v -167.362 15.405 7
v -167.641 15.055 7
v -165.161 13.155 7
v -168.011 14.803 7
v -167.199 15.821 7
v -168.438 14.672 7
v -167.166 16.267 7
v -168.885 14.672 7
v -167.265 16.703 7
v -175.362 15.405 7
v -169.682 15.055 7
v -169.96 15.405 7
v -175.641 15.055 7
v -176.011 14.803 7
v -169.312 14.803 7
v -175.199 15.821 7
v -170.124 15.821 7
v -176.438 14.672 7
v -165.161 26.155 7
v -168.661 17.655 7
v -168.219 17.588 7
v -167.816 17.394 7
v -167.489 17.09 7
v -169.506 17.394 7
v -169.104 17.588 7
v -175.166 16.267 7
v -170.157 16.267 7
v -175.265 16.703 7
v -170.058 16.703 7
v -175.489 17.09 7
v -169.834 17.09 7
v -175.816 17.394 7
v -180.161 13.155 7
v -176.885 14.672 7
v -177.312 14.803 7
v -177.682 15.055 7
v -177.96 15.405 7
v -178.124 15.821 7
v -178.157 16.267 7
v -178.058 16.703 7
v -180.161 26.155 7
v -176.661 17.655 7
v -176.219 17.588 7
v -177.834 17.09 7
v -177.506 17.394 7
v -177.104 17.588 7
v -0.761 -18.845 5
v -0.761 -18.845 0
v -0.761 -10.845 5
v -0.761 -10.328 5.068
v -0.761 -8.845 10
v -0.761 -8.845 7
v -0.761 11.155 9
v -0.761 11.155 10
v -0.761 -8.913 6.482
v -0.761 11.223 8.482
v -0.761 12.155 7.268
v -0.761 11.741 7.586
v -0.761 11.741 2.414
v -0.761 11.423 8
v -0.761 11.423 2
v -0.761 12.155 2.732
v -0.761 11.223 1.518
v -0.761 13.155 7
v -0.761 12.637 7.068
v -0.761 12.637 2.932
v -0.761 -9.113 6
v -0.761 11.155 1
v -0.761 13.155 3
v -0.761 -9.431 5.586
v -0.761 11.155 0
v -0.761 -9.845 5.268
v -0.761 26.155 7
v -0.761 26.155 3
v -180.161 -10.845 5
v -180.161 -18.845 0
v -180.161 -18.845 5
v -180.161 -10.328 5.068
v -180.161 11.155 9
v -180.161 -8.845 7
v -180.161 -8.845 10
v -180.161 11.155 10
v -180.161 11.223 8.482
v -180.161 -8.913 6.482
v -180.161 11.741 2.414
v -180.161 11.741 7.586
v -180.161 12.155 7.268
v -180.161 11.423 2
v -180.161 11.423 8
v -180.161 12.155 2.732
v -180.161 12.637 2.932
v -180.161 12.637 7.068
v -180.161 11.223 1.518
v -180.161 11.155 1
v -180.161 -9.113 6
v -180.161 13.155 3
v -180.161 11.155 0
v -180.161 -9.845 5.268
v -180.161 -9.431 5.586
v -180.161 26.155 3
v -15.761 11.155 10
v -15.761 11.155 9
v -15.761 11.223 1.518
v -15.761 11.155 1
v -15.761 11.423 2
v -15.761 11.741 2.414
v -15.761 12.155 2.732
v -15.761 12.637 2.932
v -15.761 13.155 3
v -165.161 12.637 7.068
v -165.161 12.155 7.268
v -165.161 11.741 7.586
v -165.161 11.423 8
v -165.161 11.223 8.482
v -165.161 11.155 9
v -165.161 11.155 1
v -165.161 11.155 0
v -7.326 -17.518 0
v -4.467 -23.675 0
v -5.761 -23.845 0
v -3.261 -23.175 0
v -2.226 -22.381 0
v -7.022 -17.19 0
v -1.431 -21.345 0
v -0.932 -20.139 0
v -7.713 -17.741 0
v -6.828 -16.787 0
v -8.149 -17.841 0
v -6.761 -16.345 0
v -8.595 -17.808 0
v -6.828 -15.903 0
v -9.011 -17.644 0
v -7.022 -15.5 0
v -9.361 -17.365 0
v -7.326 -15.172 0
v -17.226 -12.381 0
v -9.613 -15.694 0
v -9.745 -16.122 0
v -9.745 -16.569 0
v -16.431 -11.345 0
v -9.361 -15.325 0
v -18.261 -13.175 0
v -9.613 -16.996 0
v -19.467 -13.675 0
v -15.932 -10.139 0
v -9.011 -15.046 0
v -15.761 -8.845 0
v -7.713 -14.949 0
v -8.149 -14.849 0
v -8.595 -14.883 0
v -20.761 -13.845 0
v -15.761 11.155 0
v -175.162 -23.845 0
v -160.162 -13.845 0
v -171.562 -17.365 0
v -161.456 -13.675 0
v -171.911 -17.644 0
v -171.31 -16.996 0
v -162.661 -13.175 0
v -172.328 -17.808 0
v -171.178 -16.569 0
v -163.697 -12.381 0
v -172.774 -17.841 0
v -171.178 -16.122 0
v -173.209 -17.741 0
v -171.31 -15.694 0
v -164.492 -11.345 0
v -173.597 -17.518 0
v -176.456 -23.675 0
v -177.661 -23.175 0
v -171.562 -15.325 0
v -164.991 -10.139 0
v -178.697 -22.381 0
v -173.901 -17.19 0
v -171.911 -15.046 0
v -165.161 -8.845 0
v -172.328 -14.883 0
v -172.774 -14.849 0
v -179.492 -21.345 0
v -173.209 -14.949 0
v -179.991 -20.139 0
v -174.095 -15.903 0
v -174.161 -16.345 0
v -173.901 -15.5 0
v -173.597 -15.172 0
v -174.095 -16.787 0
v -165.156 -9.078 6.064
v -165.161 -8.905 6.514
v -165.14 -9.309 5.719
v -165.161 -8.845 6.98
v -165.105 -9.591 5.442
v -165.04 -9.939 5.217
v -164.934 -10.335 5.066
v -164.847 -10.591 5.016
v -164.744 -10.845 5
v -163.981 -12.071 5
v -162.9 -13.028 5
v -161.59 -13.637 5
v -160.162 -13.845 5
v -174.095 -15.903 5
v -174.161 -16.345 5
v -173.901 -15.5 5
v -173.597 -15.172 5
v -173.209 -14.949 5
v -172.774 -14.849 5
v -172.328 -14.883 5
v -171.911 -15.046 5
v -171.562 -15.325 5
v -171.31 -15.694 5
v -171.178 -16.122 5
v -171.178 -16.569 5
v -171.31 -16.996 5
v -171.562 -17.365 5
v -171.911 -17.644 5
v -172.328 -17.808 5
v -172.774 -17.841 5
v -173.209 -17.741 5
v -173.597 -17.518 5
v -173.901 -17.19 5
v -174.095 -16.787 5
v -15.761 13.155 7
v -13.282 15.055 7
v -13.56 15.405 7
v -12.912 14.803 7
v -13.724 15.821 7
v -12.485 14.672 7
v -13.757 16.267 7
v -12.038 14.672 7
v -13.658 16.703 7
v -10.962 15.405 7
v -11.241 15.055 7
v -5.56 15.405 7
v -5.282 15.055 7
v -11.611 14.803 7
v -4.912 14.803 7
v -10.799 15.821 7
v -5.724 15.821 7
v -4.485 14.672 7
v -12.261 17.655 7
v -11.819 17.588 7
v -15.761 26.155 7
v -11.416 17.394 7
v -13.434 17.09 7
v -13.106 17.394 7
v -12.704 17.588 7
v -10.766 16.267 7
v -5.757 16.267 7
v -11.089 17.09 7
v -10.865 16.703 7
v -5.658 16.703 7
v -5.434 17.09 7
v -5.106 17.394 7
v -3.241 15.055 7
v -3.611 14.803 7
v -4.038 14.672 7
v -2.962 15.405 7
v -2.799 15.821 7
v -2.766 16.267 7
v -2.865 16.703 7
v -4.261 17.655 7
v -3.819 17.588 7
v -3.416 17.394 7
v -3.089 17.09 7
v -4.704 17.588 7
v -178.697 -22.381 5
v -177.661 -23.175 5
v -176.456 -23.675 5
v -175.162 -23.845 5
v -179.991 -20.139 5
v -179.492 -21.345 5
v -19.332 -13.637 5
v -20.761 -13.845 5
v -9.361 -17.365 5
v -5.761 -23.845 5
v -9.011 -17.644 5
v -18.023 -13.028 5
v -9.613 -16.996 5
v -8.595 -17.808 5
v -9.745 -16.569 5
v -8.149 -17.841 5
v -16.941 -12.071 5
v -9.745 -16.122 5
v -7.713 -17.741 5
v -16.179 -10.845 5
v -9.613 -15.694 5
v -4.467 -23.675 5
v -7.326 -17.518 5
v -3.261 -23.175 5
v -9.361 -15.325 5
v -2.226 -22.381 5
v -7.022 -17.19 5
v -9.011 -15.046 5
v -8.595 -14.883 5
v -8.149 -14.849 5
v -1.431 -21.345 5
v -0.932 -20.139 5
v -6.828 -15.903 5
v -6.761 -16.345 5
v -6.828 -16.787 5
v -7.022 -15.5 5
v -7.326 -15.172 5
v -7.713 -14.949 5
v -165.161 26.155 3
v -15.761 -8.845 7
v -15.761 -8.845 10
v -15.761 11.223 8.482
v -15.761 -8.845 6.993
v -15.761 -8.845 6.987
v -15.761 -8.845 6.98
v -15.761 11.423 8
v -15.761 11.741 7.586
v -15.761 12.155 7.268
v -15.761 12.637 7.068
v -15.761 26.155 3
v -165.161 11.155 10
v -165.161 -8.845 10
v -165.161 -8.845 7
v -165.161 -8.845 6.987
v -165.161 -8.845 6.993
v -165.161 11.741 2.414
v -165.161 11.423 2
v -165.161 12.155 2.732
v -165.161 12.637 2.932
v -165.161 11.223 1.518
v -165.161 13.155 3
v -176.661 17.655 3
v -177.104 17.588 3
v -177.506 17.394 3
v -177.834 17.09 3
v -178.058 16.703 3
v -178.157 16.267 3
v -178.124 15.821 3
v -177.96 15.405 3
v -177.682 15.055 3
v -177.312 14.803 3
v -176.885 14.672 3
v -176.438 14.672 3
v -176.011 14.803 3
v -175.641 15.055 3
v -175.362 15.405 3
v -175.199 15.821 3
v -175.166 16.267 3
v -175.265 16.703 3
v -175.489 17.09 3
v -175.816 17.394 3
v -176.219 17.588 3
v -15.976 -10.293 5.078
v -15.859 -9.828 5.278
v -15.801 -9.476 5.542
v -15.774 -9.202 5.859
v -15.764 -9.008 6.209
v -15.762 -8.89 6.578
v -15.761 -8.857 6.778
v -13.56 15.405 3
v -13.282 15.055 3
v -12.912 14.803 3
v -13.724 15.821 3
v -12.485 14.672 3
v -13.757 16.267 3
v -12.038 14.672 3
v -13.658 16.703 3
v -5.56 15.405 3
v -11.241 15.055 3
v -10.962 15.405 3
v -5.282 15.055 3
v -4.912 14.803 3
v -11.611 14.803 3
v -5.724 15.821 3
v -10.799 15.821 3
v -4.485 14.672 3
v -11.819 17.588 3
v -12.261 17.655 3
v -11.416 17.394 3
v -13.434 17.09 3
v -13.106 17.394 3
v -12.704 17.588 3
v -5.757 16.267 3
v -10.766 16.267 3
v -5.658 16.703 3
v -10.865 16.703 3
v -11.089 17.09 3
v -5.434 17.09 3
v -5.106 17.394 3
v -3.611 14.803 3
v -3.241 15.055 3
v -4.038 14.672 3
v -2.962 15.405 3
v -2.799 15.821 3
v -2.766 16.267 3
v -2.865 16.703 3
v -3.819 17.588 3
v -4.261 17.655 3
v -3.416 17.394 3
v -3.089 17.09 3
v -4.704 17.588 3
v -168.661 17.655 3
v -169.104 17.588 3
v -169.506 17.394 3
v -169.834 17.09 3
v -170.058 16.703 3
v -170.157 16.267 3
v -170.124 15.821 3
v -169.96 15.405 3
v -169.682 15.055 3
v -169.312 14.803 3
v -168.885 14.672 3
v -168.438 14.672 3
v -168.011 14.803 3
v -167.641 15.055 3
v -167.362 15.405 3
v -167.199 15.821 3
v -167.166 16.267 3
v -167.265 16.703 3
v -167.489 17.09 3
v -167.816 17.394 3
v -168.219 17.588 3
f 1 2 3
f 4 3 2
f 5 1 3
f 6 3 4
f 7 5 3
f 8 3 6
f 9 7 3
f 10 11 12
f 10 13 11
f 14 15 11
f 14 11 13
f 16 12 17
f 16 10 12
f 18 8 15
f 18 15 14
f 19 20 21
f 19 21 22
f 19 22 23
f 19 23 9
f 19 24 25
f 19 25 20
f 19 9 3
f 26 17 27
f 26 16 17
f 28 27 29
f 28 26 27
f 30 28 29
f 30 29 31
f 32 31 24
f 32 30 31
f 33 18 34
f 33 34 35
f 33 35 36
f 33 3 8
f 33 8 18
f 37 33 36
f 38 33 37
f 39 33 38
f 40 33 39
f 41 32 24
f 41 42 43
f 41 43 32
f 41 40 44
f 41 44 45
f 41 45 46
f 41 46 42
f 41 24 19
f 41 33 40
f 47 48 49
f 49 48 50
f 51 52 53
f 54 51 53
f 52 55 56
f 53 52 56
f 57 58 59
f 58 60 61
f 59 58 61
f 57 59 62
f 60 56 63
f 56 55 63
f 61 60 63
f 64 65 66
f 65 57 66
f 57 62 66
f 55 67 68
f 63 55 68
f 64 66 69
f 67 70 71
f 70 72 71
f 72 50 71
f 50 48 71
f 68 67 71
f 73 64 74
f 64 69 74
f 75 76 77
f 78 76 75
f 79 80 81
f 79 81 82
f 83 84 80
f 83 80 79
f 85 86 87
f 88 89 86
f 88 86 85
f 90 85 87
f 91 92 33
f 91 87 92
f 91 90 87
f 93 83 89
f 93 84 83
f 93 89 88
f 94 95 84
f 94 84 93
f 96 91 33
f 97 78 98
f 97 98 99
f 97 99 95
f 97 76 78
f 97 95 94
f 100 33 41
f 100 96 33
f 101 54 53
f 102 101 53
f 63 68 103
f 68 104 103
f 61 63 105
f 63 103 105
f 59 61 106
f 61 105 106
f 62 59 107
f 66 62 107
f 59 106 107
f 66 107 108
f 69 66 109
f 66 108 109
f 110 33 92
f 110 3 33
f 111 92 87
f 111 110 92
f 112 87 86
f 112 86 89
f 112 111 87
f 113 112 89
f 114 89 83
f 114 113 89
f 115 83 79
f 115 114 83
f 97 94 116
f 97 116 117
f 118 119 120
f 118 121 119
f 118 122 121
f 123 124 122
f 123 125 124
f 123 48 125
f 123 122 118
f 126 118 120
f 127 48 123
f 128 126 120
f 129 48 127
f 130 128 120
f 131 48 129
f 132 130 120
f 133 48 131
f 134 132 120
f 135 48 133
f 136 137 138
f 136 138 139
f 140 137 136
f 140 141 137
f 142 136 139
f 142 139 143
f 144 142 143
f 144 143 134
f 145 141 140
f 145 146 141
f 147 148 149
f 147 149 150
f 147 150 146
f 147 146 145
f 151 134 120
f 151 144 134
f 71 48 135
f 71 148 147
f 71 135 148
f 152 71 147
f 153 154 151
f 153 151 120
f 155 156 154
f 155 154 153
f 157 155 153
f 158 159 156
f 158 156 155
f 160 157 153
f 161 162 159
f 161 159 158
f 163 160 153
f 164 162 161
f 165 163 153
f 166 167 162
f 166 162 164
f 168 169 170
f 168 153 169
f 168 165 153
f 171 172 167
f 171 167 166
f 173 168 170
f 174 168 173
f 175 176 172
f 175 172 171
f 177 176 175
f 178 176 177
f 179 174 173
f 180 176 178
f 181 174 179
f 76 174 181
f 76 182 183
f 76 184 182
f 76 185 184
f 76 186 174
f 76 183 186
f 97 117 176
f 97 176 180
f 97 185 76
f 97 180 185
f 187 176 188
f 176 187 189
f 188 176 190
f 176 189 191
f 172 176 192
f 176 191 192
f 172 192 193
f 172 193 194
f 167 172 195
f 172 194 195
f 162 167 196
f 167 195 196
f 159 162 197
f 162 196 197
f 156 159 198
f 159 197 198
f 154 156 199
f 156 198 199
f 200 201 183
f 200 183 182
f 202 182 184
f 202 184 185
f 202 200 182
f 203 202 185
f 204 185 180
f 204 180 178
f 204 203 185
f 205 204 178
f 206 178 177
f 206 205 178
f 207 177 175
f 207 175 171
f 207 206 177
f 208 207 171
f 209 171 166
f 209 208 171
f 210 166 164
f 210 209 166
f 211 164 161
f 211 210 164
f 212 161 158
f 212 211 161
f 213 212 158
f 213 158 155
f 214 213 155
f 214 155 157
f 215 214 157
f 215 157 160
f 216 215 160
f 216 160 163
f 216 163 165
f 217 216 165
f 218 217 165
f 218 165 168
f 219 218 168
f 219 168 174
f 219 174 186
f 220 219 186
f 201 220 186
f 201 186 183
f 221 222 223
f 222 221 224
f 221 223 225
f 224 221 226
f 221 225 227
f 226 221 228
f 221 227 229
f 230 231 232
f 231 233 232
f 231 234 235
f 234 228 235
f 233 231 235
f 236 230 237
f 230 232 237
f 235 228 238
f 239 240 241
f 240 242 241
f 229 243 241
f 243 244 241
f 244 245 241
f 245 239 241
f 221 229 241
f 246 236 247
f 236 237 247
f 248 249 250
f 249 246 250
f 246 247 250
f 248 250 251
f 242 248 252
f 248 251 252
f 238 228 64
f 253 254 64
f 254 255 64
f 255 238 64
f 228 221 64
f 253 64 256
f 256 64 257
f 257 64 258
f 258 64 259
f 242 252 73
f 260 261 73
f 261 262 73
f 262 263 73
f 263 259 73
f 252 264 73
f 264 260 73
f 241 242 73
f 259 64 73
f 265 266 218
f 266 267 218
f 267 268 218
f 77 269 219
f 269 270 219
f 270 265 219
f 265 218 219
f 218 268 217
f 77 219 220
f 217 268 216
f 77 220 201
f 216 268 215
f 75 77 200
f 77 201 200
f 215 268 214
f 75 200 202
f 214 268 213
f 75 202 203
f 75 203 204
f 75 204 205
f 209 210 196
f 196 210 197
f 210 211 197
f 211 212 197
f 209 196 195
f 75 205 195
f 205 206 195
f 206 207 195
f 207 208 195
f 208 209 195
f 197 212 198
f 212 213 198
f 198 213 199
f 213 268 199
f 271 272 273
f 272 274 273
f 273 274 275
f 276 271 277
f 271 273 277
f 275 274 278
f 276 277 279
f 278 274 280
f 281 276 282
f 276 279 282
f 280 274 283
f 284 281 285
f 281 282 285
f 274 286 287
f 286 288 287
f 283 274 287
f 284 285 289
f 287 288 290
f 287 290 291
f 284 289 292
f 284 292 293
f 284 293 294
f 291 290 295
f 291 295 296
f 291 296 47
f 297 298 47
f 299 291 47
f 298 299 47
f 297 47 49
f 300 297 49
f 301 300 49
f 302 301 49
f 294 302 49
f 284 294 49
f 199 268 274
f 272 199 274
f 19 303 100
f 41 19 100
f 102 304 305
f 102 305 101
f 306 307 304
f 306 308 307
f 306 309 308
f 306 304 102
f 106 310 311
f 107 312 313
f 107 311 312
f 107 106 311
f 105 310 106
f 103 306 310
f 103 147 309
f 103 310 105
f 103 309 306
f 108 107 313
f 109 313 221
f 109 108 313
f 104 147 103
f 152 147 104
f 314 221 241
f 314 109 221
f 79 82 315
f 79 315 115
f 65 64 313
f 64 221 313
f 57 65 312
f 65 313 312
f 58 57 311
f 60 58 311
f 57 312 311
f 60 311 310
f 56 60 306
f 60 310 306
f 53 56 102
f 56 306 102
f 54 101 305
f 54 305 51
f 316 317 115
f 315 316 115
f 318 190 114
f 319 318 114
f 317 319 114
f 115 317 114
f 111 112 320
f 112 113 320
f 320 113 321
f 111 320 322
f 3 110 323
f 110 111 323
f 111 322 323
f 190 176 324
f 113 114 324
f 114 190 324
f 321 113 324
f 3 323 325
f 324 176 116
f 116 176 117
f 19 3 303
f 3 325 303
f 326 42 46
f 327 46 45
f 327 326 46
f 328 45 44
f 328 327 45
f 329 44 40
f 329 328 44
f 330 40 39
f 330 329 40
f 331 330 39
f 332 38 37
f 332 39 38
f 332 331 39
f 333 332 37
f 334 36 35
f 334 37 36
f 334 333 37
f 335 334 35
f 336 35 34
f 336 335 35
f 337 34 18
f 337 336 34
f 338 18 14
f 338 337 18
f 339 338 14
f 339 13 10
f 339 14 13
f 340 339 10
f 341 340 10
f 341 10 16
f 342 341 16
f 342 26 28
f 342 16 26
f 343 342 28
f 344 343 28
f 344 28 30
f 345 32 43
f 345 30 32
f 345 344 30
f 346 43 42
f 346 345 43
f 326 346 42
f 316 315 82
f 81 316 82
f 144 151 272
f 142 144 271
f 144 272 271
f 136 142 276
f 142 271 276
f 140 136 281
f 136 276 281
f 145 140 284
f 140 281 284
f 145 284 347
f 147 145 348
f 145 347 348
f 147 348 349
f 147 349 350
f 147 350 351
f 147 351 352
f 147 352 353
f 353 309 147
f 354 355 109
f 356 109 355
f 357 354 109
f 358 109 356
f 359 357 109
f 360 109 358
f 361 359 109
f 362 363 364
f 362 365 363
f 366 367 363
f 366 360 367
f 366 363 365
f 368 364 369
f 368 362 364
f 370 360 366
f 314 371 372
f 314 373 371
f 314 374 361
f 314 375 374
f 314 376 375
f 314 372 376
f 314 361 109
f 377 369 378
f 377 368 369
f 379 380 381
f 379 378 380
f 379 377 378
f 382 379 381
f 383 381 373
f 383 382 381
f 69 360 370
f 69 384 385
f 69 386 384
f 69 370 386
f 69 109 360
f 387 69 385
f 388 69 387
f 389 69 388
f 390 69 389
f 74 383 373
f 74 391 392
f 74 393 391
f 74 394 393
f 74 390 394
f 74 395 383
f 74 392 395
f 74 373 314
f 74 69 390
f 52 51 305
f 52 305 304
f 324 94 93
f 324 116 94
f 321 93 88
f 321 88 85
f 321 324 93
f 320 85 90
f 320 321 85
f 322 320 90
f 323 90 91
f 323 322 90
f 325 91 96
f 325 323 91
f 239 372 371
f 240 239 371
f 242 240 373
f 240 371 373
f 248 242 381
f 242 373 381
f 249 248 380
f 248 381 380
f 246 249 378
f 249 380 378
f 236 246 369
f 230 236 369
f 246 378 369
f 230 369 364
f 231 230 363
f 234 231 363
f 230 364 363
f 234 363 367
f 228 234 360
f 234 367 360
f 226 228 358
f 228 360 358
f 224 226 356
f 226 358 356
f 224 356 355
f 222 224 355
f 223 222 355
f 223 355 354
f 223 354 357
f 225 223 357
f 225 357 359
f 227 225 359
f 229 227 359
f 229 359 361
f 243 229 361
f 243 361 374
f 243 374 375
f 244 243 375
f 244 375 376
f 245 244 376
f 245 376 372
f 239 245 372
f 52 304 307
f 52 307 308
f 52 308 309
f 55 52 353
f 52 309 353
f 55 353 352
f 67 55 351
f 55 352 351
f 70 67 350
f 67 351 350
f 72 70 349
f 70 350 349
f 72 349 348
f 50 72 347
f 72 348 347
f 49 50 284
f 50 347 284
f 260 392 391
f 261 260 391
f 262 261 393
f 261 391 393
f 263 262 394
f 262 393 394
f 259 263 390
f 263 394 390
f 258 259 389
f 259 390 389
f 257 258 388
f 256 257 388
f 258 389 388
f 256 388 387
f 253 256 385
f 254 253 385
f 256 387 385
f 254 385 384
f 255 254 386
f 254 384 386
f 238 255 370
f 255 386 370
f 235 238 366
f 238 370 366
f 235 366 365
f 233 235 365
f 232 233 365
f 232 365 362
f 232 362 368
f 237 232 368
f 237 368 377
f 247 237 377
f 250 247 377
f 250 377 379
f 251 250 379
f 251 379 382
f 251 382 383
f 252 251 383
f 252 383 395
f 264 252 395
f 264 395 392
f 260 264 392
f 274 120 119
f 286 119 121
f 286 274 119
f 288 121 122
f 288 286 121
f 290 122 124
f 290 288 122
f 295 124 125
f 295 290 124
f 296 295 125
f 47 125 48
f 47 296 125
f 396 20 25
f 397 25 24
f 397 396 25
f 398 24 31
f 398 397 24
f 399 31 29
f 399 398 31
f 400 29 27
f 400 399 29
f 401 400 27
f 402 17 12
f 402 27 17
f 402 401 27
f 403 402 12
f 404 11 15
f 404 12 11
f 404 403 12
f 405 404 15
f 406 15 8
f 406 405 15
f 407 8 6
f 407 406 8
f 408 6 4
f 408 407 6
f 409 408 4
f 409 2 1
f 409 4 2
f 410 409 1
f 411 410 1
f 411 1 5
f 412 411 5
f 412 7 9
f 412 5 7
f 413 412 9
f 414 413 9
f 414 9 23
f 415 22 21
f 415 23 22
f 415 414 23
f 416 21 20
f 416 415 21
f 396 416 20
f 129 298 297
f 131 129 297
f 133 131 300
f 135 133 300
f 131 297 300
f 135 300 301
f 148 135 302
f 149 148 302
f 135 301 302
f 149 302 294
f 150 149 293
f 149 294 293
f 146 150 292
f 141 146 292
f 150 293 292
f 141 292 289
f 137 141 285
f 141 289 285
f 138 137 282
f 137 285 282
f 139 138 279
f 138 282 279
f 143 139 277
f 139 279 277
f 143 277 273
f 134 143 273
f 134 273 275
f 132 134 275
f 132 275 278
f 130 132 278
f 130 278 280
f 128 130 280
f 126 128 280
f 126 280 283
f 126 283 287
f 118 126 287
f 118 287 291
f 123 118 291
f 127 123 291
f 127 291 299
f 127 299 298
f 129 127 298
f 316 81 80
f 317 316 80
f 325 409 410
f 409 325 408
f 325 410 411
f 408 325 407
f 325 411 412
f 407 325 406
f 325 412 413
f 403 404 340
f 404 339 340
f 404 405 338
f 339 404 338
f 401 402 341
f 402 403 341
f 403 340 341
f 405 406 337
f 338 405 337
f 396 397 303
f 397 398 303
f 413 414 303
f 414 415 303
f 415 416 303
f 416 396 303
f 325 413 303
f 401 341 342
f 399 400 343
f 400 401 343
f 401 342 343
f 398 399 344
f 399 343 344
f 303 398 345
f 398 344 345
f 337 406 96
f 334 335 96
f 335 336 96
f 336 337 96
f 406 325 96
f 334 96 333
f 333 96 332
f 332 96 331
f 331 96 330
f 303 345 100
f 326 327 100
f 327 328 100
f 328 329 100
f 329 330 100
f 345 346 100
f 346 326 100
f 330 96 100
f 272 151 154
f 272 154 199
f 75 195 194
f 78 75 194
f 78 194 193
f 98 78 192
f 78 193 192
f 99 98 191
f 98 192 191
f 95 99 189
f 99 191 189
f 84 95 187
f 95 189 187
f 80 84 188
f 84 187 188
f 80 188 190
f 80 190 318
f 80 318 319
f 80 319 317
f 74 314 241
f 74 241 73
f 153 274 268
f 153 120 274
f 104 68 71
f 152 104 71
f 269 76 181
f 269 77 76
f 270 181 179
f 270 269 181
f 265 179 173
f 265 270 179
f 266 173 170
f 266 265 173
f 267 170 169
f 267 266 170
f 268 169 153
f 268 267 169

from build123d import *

# Parameters (mm, degrees)
SKETCH1_W            = 15
SKETCH1_H            = 50
BOSS_EXTRUDE1_DEPTH  = 10
SKETCH2_W            = 3
SKETCH2_H            = 15
CUT_EXTRUDE1_DEPTH   = 20
SKETCH3_R            = 1.5
CUT_EXTRUDE2_DEPTH   = 20
SKETCH4_W            = 5
SKETCH4_H            = 15
CUT_EXTRUDE3_DEPTH   = 20
CUT_EXTRUDE4_REACH   = 32.943
SKETCH5_R            = 1.5
FILLET1_R            = 2
SKETCH6_W            = 5
SKETCH6_H            = 10
BOSS_EXTRUDE2_DEPTH  = 149.4
FILLET1_OF_MIRROR5_R = 2
FILLET2_R            = 5


with BuildPart() as part:
    # Sketch1 → Boss-Extrude1 (new body)
    with BuildSketch(Plane.XY):
        with Locations((-8.26142132, 1.154822335)):
            Rectangle(SKETCH1_W, SKETCH1_H)
    boss_extrude1 = extrude(amount=BOSS_EXTRUDE1_DEPTH)

    # Sketch2 → Cut-Extrude1 (cut)
    with BuildSketch(Plane(origin=(-0.76142132, 0, 0), x_dir=(0, 0, -1), z_dir=(1, 0, 0))):
        with Locations((-1.5, 18.654822335)):
            Rectangle(SKETCH2_W, SKETCH2_H)
        with Locations((-8.5, 18.654822335)):
            Rectangle(SKETCH2_W, SKETCH2_H)
    cut_extrude1 = extrude(amount=-CUT_EXTRUDE1_DEPTH, mode=Mode.SUBTRACT)

    # Sketch3 → Cut-Extrude2 (cut)
    with BuildSketch(Plane(origin=(0, 0, 3), x_dir=(-1, 0, 0), z_dir=(0, 0, -1))):
        with Locations(Location((4.26142132, 16.154822335, 0), (0, 0, 90))):
            Circle(SKETCH3_R)
        with Locations(Location((12.26142132, 16.154822335, 0), (0, 0, 90))):
            Circle(SKETCH3_R)
    cut_extrude2 = extrude(amount=-CUT_EXTRUDE2_DEPTH, mode=Mode.SUBTRACT)

    # Sketch4 → Cut-Extrude3 (cut)
    with BuildSketch(Plane(origin=(-0.76142132, 0, 0), x_dir=(0, 0, -1), z_dir=(1, 0, 0))):
        with Locations((-7.5, -16.345177665)):
            Rectangle(SKETCH4_W, SKETCH4_H)
    cut_extrude3 = extrude(amount=-CUT_EXTRUDE3_DEPTH, mode=Mode.SUBTRACT)

    # Sketch5 → Cut-Extrude4 (cut, up to next)
    with BuildSketch(Plane.XY.offset(5), mode=Mode.PRIVATE) as cut_extrude4_sk1:
        with Locations((-8.26142132, -16.345177665)):
            Circle(SKETCH5_R)
    cut_extrude4_tool1 = extrude(cut_extrude4_sk1.sketch, amount=-CUT_EXTRUDE4_REACH, mode=Mode.PRIVATE) & part.part
    cut_extrude4 = cut_extrude4_tool1.solids().sort_by_distance((-8.261421, -16.345178, 5))[0]
    add(cut_extrude4, mode=Mode.SUBTRACT)

    # Fillet1
    fillet1_edges = [part.edges().sort_by_distance(p)[0] for p in [
        (-8.26142132, 11.154822335, 3),
        (-8.26142132, 11.154822335, 7),
        (-8.26142132, -8.845177665, 5),
    ]]
    fillet(fillet1_edges, radius=FILLET1_R)

    # Sketch6 → Boss-Extrude2 (add)
    with BuildSketch(Plane.ZY.offset(15.76142132)):
        with Locations((2.5, -18.845177665)):
            Rectangle(SKETCH6_W, SKETCH6_H)
    extrude(amount=BOSS_EXTRUDE2_DEPTH)

    # Mirror5: Boss-Extrude1, Cut-Extrude1, Cut-Extrude2, Cut-Extrude3, Cut-Extrude4 across plane
    add(boss_extrude1.mirror(Plane.ZY.offset(90.46142132)))
    add(cut_extrude1.mirror(Plane.ZY.offset(90.46142132)), mode=Mode.SUBTRACT)
    add(cut_extrude2.mirror(Plane.ZY.offset(90.46142132)), mode=Mode.SUBTRACT)
    add(cut_extrude3.mirror(Plane.ZY.offset(90.46142132)), mode=Mode.SUBTRACT)
    add(cut_extrude4.mirror(Plane.ZY.offset(90.46142132)), mode=Mode.SUBTRACT)

    # Fillet1 of Mirror5
    fillet1_of_mirror5_edges = [part.edges().sort_by_distance(p)[0] for p in [
        (-172.66142132, 11.154822335, 3),
        (-172.66142132, 11.154822335, 7),
        (-172.66142132, -8.845177665, 5),
    ]]
    fillet(fillet1_of_mirror5_edges, radius=FILLET1_OF_MIRROR5_R)

    # Fillet2
    fillet2_edges = [part.edges().sort_by_distance(p)[0] for p in [
        (-180.16142132, -23.845177665, 2.5),
        (-0.76142132, -23.845177665, 2.5),
        (-165.16142132, -13.845177665, 2.5),
        (-15.76142132, -13.845177665, 2.5),
    ]]
    fillet(fillet2_edges, radius=FILLET2_R - 0.0001)  # a hair under: the kernel refuses the full size


solid = part.part
